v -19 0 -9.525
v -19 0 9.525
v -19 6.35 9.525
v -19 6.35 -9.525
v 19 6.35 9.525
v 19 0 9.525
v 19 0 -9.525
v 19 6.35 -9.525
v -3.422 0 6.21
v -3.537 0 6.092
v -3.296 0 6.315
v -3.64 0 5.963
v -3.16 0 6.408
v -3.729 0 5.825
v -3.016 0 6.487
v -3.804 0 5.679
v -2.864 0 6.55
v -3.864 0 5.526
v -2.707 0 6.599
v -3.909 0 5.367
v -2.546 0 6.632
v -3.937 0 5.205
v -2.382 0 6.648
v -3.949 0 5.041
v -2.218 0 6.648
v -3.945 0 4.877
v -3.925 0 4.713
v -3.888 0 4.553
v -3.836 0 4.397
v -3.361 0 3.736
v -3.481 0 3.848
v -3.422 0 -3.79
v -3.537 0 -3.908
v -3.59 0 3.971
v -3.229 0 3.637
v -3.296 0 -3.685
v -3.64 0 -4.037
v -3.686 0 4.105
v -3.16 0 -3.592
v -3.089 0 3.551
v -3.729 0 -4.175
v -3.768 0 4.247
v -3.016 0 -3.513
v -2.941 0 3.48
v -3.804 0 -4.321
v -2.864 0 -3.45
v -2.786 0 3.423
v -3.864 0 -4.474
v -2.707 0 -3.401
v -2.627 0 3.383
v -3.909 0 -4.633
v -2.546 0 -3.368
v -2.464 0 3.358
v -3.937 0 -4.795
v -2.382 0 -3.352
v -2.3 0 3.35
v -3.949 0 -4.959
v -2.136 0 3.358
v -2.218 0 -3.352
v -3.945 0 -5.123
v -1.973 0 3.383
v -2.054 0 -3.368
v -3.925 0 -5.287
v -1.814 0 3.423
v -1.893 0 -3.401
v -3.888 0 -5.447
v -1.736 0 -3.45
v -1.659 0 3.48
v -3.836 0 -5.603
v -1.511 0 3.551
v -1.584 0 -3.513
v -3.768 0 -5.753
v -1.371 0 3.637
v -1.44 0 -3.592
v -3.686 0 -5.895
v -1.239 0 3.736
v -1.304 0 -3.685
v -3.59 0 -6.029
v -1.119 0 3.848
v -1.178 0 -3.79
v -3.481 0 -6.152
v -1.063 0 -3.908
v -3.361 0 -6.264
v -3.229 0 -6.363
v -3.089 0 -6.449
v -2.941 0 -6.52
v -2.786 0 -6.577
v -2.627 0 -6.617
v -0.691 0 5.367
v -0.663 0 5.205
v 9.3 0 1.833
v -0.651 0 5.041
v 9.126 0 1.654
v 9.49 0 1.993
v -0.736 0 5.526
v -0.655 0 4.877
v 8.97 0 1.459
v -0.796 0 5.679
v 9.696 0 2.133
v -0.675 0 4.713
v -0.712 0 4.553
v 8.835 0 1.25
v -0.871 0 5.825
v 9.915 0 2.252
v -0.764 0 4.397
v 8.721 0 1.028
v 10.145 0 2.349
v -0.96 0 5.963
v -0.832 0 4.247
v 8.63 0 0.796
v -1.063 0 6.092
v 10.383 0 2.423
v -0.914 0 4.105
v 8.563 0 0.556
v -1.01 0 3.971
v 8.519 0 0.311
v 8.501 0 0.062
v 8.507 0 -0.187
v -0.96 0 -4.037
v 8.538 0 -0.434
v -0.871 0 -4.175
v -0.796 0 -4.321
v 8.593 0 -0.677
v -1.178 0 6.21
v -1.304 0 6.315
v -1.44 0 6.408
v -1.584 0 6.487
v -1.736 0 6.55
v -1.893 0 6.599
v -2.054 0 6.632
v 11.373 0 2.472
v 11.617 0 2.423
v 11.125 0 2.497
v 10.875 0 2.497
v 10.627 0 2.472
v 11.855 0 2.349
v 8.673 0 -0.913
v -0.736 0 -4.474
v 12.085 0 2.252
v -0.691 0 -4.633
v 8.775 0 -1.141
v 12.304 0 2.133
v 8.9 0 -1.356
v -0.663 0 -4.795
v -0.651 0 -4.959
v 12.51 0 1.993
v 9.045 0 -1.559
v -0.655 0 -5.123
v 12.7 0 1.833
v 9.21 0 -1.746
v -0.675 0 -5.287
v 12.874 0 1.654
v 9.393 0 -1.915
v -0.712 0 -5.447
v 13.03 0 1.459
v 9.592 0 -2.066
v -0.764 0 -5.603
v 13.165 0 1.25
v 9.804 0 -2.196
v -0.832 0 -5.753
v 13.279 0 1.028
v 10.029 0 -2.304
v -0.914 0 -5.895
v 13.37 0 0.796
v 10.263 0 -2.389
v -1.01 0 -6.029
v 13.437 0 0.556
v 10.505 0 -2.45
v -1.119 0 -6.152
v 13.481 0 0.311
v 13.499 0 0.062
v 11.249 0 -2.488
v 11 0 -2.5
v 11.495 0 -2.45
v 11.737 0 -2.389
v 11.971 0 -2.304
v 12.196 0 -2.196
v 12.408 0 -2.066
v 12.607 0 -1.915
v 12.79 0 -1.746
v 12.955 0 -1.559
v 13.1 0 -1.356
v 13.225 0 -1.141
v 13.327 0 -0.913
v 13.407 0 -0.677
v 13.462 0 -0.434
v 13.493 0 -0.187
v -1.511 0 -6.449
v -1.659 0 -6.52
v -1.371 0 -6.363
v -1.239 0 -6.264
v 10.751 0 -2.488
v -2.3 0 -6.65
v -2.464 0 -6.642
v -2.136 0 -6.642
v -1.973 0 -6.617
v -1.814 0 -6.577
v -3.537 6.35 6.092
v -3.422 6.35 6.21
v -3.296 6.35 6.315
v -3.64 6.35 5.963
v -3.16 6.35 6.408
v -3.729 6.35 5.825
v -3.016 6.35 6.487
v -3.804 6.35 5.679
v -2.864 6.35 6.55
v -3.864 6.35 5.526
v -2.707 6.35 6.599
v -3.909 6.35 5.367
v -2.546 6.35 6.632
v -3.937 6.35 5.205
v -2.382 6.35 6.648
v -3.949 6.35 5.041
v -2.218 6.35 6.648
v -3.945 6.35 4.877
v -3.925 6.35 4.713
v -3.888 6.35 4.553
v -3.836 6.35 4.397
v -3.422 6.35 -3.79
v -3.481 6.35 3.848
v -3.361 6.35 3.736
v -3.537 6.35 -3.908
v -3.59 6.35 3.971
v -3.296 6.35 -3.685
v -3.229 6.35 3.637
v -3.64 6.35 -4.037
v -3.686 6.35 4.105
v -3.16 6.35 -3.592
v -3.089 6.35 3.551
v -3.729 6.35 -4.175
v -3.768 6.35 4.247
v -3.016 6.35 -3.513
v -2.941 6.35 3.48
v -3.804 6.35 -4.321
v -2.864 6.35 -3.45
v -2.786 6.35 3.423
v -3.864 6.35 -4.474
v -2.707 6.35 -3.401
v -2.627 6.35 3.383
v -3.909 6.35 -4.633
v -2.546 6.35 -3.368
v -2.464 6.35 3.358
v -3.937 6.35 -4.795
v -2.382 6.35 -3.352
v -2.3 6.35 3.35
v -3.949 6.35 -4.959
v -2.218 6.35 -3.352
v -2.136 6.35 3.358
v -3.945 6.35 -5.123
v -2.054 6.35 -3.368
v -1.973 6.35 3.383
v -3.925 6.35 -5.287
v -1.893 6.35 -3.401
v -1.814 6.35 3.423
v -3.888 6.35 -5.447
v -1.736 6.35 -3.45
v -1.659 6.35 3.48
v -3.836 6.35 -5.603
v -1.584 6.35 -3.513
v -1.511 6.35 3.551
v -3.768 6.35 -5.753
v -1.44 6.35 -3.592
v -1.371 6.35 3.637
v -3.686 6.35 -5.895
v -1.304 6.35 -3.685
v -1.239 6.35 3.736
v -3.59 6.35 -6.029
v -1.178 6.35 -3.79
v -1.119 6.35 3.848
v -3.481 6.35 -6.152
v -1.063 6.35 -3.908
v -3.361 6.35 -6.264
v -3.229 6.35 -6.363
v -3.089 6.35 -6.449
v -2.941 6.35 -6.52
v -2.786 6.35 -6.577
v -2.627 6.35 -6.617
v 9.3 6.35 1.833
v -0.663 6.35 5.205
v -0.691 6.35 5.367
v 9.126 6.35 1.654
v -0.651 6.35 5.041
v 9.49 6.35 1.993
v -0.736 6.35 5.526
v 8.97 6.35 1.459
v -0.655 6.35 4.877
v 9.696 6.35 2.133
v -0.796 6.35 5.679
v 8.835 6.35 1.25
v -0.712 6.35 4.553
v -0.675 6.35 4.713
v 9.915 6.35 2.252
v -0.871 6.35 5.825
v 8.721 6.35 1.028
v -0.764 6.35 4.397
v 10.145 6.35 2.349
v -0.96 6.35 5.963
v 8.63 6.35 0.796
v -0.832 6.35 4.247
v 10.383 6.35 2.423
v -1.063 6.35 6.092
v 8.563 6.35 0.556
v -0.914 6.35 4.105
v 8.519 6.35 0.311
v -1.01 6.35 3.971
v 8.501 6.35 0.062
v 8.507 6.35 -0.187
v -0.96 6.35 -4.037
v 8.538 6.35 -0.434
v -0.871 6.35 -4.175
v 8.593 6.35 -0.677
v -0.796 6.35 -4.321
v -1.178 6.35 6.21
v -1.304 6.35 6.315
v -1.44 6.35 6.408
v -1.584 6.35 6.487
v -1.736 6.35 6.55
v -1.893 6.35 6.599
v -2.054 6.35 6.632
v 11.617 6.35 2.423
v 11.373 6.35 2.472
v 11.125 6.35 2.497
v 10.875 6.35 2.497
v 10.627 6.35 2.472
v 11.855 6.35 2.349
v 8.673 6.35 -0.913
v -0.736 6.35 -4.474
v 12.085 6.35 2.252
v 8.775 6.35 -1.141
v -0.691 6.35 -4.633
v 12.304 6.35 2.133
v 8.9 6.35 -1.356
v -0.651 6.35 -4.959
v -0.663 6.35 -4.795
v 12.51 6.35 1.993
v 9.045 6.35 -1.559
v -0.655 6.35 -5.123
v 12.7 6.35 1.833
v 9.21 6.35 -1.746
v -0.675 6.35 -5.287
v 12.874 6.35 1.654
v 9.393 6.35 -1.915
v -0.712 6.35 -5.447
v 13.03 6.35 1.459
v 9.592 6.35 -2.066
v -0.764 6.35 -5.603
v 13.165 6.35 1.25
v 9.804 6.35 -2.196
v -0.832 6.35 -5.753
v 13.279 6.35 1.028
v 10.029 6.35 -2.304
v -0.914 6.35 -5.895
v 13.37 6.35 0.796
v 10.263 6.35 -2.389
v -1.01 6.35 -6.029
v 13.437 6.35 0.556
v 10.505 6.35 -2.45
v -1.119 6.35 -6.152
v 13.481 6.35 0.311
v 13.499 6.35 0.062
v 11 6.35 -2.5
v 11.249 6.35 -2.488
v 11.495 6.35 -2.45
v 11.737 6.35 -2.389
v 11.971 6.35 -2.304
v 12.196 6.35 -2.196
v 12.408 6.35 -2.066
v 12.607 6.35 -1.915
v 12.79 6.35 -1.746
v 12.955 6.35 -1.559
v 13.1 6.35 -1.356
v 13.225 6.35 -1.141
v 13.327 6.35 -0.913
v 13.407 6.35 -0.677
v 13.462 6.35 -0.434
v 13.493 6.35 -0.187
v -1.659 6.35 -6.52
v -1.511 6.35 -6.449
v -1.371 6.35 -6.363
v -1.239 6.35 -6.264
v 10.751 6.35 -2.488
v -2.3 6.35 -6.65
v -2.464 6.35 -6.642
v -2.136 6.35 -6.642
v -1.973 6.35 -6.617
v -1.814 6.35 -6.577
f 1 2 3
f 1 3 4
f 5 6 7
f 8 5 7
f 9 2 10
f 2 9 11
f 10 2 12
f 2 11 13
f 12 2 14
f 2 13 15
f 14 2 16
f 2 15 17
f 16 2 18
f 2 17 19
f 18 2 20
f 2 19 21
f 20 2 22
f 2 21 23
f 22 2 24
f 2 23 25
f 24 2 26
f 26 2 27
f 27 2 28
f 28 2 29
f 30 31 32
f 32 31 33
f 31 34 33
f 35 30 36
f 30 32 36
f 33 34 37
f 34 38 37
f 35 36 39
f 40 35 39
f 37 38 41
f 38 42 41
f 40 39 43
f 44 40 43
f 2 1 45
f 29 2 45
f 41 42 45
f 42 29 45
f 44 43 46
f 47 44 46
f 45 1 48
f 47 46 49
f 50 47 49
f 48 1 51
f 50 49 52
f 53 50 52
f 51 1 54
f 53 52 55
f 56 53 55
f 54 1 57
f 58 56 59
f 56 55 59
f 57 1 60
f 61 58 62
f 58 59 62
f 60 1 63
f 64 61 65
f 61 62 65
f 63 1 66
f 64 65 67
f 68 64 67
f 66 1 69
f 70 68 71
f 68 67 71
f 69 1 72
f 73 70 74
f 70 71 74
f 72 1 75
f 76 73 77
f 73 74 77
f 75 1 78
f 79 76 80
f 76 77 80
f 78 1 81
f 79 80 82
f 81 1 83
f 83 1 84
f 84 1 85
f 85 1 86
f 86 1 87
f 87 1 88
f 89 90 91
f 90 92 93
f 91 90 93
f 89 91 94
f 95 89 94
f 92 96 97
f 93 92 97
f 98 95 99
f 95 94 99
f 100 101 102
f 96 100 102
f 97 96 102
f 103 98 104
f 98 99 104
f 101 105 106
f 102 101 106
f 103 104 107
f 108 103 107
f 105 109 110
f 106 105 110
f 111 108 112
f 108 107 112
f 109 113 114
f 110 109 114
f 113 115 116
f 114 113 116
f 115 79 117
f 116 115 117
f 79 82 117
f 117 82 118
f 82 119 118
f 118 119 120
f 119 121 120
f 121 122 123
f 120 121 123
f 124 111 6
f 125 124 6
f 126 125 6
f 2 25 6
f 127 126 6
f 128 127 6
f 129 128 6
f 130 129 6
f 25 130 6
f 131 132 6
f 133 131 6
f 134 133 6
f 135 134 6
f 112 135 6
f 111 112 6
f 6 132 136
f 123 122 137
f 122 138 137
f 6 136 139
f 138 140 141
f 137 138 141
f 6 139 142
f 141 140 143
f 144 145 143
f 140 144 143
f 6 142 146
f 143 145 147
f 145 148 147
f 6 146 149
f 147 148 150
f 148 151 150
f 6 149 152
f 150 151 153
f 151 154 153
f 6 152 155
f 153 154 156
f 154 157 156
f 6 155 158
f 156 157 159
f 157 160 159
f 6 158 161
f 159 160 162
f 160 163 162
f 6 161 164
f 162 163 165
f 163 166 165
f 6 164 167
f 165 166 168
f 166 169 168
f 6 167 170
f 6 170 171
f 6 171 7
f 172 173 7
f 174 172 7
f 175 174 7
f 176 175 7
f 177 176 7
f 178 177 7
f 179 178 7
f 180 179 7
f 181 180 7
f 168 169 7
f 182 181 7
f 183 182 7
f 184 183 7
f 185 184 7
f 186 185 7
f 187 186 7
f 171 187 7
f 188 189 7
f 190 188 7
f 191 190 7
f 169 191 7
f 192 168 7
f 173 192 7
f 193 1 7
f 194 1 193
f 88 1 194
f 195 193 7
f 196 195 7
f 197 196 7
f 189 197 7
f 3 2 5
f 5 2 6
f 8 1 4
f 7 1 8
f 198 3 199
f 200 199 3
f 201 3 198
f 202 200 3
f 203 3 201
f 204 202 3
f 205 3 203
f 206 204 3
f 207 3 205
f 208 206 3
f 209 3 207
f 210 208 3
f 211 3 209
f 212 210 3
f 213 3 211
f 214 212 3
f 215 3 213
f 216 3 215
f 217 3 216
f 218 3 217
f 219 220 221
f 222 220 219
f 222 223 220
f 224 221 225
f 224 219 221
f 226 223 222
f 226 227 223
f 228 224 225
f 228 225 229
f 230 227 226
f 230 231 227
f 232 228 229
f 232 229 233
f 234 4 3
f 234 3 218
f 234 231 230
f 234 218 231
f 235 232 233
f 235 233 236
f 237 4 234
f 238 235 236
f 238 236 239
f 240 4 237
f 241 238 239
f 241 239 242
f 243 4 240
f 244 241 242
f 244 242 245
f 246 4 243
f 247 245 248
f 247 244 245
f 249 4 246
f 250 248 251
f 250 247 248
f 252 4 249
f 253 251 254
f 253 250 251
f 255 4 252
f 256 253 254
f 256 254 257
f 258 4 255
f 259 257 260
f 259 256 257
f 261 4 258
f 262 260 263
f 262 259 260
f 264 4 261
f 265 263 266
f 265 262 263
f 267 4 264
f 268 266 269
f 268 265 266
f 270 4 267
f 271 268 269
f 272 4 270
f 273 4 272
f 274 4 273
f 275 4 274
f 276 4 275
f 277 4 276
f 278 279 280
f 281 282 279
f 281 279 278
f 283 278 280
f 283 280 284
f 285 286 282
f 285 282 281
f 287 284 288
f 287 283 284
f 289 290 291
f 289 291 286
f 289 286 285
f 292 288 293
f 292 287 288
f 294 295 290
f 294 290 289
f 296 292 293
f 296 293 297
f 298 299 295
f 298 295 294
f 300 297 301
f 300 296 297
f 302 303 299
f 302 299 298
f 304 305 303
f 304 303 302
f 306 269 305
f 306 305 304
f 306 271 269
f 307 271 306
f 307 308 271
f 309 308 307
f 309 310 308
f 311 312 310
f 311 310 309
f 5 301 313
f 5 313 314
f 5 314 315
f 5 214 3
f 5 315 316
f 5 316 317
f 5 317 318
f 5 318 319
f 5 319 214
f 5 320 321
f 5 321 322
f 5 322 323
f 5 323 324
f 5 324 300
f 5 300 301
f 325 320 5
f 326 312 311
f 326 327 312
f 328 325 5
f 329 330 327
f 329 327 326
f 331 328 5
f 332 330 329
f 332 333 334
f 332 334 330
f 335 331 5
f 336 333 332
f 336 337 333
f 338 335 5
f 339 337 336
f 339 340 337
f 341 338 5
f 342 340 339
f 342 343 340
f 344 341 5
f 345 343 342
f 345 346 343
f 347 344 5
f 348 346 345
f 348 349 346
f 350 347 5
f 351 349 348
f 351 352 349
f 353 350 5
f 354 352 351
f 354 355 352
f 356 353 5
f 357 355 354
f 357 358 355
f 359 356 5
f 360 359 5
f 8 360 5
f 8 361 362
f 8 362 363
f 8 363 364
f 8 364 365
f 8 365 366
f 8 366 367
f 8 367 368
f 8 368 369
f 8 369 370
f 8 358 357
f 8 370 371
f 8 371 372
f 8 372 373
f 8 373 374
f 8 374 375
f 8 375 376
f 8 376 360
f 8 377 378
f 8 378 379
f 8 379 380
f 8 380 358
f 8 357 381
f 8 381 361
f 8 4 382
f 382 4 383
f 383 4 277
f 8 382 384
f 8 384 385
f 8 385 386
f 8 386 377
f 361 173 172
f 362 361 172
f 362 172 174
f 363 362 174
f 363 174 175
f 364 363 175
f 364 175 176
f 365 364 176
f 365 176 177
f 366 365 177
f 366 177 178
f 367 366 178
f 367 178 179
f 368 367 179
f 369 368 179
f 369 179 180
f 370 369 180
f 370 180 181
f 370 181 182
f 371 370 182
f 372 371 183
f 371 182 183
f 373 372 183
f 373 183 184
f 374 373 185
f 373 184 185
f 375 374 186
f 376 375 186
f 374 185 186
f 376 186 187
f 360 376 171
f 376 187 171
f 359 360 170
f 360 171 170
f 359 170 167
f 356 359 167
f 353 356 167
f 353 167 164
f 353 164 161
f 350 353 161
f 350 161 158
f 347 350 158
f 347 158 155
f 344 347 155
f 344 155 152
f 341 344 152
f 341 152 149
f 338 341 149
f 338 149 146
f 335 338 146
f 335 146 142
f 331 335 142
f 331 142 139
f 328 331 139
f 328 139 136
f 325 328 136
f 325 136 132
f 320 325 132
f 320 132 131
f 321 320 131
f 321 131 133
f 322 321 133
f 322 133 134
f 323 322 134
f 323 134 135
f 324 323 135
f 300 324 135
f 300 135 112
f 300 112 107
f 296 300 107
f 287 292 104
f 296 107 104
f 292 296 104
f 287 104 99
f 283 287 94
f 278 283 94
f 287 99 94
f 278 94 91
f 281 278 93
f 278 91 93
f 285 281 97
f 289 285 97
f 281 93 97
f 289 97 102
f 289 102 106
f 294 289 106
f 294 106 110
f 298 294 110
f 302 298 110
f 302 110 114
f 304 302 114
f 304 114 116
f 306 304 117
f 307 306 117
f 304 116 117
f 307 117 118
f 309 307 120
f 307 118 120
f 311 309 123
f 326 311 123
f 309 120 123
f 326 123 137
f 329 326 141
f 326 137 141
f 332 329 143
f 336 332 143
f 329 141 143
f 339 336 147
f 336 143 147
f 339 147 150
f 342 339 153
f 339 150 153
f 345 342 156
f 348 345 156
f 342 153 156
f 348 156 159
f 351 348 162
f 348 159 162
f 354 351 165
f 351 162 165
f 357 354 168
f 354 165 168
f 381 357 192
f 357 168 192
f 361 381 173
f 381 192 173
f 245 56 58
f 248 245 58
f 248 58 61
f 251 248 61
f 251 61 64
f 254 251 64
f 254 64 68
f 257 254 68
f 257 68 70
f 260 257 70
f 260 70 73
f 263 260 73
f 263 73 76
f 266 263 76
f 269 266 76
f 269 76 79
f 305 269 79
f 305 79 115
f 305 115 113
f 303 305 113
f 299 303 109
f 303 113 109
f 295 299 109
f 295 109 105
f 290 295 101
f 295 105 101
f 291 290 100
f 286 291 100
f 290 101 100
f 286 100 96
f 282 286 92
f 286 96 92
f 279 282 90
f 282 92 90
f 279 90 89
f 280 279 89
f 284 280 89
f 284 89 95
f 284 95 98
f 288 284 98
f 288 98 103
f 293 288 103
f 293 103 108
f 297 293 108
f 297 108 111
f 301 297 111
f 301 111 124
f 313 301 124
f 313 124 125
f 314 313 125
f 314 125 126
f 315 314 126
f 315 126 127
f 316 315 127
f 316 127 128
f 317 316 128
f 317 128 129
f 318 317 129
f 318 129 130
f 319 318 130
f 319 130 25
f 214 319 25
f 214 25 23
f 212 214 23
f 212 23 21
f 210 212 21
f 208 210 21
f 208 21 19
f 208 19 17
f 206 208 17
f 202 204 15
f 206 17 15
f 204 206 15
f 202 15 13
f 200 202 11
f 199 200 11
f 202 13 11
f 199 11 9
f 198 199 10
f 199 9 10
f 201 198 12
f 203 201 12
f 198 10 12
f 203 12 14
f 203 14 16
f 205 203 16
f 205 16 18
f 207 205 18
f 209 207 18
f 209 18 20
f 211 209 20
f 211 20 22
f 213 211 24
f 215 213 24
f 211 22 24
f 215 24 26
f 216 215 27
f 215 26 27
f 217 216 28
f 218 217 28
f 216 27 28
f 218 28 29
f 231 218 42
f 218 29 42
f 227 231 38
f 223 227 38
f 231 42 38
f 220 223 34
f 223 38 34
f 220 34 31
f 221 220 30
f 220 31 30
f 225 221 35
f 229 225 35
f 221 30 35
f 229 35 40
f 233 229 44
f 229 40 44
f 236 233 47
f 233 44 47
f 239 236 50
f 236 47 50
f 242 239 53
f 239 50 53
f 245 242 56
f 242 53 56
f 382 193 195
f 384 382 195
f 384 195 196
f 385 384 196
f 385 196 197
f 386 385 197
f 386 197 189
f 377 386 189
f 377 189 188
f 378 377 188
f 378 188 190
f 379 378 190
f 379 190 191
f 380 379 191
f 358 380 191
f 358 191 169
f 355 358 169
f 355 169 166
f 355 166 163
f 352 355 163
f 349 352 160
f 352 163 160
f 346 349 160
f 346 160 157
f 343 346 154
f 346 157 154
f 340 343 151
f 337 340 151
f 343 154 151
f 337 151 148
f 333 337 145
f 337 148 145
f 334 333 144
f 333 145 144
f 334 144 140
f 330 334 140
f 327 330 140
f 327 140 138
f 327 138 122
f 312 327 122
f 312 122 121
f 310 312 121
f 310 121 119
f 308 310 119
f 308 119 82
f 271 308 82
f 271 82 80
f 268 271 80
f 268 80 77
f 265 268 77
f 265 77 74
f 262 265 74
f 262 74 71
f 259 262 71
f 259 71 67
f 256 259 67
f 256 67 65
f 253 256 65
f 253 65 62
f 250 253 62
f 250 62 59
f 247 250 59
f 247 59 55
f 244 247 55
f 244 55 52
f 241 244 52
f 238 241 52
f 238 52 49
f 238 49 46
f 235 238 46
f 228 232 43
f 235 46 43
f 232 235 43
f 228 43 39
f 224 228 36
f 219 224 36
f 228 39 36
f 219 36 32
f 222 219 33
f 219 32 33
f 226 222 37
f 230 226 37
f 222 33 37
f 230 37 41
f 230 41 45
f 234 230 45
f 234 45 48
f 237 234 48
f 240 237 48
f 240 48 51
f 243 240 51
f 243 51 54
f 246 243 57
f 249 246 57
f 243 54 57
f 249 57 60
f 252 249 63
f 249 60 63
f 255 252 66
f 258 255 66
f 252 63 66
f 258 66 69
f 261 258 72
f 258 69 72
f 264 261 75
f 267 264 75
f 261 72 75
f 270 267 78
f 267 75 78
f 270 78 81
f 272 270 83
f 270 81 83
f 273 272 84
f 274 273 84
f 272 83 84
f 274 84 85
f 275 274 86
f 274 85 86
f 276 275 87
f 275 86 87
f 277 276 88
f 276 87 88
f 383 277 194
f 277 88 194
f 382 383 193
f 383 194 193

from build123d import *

# Parameters (mm, degrees)
SKETCH1_W             = 38
SKETCH1_H             = 19.05
BOSS_EXTRUDE1_DEPTH   = 6.35
M4X0_7_TAPPED_HOLE1_D = 3.3
M6X1_0_TAPPED_HOLE1_D = 5


with BuildPart() as part:
    # Sketch1 → Boss-Extrude1 (new body)
    with BuildSketch(Plane(origin=(0, 0, 0), x_dir=(1, 0, 0), z_dir=(0, 1, 0))):
        Rectangle(SKETCH1_W, SKETCH1_H)
    extrude(amount=BOSS_EXTRUDE1_DEPTH)

    # M4x0.7 Tapped Hole1 (through all)
    with Locations(Plane(origin=(-2.3, 6.35, -5), x_dir=(0, 0, 1), z_dir=(0, 1, 0))):
        with Locations((0, 0), (10, 0)):
            Hole(M4X0_7_TAPPED_HOLE1_D / 2)

    # M6x1.0 Tapped Hole1 (through all)
    with Locations(Plane(origin=(11, 6.35, 0), x_dir=(0, 0, 1), z_dir=(0, 1, 0))):
        with Locations((0, 0)):
            Hole(M6X1_0_TAPPED_HOLE1_D / 2)


solid = part.part
